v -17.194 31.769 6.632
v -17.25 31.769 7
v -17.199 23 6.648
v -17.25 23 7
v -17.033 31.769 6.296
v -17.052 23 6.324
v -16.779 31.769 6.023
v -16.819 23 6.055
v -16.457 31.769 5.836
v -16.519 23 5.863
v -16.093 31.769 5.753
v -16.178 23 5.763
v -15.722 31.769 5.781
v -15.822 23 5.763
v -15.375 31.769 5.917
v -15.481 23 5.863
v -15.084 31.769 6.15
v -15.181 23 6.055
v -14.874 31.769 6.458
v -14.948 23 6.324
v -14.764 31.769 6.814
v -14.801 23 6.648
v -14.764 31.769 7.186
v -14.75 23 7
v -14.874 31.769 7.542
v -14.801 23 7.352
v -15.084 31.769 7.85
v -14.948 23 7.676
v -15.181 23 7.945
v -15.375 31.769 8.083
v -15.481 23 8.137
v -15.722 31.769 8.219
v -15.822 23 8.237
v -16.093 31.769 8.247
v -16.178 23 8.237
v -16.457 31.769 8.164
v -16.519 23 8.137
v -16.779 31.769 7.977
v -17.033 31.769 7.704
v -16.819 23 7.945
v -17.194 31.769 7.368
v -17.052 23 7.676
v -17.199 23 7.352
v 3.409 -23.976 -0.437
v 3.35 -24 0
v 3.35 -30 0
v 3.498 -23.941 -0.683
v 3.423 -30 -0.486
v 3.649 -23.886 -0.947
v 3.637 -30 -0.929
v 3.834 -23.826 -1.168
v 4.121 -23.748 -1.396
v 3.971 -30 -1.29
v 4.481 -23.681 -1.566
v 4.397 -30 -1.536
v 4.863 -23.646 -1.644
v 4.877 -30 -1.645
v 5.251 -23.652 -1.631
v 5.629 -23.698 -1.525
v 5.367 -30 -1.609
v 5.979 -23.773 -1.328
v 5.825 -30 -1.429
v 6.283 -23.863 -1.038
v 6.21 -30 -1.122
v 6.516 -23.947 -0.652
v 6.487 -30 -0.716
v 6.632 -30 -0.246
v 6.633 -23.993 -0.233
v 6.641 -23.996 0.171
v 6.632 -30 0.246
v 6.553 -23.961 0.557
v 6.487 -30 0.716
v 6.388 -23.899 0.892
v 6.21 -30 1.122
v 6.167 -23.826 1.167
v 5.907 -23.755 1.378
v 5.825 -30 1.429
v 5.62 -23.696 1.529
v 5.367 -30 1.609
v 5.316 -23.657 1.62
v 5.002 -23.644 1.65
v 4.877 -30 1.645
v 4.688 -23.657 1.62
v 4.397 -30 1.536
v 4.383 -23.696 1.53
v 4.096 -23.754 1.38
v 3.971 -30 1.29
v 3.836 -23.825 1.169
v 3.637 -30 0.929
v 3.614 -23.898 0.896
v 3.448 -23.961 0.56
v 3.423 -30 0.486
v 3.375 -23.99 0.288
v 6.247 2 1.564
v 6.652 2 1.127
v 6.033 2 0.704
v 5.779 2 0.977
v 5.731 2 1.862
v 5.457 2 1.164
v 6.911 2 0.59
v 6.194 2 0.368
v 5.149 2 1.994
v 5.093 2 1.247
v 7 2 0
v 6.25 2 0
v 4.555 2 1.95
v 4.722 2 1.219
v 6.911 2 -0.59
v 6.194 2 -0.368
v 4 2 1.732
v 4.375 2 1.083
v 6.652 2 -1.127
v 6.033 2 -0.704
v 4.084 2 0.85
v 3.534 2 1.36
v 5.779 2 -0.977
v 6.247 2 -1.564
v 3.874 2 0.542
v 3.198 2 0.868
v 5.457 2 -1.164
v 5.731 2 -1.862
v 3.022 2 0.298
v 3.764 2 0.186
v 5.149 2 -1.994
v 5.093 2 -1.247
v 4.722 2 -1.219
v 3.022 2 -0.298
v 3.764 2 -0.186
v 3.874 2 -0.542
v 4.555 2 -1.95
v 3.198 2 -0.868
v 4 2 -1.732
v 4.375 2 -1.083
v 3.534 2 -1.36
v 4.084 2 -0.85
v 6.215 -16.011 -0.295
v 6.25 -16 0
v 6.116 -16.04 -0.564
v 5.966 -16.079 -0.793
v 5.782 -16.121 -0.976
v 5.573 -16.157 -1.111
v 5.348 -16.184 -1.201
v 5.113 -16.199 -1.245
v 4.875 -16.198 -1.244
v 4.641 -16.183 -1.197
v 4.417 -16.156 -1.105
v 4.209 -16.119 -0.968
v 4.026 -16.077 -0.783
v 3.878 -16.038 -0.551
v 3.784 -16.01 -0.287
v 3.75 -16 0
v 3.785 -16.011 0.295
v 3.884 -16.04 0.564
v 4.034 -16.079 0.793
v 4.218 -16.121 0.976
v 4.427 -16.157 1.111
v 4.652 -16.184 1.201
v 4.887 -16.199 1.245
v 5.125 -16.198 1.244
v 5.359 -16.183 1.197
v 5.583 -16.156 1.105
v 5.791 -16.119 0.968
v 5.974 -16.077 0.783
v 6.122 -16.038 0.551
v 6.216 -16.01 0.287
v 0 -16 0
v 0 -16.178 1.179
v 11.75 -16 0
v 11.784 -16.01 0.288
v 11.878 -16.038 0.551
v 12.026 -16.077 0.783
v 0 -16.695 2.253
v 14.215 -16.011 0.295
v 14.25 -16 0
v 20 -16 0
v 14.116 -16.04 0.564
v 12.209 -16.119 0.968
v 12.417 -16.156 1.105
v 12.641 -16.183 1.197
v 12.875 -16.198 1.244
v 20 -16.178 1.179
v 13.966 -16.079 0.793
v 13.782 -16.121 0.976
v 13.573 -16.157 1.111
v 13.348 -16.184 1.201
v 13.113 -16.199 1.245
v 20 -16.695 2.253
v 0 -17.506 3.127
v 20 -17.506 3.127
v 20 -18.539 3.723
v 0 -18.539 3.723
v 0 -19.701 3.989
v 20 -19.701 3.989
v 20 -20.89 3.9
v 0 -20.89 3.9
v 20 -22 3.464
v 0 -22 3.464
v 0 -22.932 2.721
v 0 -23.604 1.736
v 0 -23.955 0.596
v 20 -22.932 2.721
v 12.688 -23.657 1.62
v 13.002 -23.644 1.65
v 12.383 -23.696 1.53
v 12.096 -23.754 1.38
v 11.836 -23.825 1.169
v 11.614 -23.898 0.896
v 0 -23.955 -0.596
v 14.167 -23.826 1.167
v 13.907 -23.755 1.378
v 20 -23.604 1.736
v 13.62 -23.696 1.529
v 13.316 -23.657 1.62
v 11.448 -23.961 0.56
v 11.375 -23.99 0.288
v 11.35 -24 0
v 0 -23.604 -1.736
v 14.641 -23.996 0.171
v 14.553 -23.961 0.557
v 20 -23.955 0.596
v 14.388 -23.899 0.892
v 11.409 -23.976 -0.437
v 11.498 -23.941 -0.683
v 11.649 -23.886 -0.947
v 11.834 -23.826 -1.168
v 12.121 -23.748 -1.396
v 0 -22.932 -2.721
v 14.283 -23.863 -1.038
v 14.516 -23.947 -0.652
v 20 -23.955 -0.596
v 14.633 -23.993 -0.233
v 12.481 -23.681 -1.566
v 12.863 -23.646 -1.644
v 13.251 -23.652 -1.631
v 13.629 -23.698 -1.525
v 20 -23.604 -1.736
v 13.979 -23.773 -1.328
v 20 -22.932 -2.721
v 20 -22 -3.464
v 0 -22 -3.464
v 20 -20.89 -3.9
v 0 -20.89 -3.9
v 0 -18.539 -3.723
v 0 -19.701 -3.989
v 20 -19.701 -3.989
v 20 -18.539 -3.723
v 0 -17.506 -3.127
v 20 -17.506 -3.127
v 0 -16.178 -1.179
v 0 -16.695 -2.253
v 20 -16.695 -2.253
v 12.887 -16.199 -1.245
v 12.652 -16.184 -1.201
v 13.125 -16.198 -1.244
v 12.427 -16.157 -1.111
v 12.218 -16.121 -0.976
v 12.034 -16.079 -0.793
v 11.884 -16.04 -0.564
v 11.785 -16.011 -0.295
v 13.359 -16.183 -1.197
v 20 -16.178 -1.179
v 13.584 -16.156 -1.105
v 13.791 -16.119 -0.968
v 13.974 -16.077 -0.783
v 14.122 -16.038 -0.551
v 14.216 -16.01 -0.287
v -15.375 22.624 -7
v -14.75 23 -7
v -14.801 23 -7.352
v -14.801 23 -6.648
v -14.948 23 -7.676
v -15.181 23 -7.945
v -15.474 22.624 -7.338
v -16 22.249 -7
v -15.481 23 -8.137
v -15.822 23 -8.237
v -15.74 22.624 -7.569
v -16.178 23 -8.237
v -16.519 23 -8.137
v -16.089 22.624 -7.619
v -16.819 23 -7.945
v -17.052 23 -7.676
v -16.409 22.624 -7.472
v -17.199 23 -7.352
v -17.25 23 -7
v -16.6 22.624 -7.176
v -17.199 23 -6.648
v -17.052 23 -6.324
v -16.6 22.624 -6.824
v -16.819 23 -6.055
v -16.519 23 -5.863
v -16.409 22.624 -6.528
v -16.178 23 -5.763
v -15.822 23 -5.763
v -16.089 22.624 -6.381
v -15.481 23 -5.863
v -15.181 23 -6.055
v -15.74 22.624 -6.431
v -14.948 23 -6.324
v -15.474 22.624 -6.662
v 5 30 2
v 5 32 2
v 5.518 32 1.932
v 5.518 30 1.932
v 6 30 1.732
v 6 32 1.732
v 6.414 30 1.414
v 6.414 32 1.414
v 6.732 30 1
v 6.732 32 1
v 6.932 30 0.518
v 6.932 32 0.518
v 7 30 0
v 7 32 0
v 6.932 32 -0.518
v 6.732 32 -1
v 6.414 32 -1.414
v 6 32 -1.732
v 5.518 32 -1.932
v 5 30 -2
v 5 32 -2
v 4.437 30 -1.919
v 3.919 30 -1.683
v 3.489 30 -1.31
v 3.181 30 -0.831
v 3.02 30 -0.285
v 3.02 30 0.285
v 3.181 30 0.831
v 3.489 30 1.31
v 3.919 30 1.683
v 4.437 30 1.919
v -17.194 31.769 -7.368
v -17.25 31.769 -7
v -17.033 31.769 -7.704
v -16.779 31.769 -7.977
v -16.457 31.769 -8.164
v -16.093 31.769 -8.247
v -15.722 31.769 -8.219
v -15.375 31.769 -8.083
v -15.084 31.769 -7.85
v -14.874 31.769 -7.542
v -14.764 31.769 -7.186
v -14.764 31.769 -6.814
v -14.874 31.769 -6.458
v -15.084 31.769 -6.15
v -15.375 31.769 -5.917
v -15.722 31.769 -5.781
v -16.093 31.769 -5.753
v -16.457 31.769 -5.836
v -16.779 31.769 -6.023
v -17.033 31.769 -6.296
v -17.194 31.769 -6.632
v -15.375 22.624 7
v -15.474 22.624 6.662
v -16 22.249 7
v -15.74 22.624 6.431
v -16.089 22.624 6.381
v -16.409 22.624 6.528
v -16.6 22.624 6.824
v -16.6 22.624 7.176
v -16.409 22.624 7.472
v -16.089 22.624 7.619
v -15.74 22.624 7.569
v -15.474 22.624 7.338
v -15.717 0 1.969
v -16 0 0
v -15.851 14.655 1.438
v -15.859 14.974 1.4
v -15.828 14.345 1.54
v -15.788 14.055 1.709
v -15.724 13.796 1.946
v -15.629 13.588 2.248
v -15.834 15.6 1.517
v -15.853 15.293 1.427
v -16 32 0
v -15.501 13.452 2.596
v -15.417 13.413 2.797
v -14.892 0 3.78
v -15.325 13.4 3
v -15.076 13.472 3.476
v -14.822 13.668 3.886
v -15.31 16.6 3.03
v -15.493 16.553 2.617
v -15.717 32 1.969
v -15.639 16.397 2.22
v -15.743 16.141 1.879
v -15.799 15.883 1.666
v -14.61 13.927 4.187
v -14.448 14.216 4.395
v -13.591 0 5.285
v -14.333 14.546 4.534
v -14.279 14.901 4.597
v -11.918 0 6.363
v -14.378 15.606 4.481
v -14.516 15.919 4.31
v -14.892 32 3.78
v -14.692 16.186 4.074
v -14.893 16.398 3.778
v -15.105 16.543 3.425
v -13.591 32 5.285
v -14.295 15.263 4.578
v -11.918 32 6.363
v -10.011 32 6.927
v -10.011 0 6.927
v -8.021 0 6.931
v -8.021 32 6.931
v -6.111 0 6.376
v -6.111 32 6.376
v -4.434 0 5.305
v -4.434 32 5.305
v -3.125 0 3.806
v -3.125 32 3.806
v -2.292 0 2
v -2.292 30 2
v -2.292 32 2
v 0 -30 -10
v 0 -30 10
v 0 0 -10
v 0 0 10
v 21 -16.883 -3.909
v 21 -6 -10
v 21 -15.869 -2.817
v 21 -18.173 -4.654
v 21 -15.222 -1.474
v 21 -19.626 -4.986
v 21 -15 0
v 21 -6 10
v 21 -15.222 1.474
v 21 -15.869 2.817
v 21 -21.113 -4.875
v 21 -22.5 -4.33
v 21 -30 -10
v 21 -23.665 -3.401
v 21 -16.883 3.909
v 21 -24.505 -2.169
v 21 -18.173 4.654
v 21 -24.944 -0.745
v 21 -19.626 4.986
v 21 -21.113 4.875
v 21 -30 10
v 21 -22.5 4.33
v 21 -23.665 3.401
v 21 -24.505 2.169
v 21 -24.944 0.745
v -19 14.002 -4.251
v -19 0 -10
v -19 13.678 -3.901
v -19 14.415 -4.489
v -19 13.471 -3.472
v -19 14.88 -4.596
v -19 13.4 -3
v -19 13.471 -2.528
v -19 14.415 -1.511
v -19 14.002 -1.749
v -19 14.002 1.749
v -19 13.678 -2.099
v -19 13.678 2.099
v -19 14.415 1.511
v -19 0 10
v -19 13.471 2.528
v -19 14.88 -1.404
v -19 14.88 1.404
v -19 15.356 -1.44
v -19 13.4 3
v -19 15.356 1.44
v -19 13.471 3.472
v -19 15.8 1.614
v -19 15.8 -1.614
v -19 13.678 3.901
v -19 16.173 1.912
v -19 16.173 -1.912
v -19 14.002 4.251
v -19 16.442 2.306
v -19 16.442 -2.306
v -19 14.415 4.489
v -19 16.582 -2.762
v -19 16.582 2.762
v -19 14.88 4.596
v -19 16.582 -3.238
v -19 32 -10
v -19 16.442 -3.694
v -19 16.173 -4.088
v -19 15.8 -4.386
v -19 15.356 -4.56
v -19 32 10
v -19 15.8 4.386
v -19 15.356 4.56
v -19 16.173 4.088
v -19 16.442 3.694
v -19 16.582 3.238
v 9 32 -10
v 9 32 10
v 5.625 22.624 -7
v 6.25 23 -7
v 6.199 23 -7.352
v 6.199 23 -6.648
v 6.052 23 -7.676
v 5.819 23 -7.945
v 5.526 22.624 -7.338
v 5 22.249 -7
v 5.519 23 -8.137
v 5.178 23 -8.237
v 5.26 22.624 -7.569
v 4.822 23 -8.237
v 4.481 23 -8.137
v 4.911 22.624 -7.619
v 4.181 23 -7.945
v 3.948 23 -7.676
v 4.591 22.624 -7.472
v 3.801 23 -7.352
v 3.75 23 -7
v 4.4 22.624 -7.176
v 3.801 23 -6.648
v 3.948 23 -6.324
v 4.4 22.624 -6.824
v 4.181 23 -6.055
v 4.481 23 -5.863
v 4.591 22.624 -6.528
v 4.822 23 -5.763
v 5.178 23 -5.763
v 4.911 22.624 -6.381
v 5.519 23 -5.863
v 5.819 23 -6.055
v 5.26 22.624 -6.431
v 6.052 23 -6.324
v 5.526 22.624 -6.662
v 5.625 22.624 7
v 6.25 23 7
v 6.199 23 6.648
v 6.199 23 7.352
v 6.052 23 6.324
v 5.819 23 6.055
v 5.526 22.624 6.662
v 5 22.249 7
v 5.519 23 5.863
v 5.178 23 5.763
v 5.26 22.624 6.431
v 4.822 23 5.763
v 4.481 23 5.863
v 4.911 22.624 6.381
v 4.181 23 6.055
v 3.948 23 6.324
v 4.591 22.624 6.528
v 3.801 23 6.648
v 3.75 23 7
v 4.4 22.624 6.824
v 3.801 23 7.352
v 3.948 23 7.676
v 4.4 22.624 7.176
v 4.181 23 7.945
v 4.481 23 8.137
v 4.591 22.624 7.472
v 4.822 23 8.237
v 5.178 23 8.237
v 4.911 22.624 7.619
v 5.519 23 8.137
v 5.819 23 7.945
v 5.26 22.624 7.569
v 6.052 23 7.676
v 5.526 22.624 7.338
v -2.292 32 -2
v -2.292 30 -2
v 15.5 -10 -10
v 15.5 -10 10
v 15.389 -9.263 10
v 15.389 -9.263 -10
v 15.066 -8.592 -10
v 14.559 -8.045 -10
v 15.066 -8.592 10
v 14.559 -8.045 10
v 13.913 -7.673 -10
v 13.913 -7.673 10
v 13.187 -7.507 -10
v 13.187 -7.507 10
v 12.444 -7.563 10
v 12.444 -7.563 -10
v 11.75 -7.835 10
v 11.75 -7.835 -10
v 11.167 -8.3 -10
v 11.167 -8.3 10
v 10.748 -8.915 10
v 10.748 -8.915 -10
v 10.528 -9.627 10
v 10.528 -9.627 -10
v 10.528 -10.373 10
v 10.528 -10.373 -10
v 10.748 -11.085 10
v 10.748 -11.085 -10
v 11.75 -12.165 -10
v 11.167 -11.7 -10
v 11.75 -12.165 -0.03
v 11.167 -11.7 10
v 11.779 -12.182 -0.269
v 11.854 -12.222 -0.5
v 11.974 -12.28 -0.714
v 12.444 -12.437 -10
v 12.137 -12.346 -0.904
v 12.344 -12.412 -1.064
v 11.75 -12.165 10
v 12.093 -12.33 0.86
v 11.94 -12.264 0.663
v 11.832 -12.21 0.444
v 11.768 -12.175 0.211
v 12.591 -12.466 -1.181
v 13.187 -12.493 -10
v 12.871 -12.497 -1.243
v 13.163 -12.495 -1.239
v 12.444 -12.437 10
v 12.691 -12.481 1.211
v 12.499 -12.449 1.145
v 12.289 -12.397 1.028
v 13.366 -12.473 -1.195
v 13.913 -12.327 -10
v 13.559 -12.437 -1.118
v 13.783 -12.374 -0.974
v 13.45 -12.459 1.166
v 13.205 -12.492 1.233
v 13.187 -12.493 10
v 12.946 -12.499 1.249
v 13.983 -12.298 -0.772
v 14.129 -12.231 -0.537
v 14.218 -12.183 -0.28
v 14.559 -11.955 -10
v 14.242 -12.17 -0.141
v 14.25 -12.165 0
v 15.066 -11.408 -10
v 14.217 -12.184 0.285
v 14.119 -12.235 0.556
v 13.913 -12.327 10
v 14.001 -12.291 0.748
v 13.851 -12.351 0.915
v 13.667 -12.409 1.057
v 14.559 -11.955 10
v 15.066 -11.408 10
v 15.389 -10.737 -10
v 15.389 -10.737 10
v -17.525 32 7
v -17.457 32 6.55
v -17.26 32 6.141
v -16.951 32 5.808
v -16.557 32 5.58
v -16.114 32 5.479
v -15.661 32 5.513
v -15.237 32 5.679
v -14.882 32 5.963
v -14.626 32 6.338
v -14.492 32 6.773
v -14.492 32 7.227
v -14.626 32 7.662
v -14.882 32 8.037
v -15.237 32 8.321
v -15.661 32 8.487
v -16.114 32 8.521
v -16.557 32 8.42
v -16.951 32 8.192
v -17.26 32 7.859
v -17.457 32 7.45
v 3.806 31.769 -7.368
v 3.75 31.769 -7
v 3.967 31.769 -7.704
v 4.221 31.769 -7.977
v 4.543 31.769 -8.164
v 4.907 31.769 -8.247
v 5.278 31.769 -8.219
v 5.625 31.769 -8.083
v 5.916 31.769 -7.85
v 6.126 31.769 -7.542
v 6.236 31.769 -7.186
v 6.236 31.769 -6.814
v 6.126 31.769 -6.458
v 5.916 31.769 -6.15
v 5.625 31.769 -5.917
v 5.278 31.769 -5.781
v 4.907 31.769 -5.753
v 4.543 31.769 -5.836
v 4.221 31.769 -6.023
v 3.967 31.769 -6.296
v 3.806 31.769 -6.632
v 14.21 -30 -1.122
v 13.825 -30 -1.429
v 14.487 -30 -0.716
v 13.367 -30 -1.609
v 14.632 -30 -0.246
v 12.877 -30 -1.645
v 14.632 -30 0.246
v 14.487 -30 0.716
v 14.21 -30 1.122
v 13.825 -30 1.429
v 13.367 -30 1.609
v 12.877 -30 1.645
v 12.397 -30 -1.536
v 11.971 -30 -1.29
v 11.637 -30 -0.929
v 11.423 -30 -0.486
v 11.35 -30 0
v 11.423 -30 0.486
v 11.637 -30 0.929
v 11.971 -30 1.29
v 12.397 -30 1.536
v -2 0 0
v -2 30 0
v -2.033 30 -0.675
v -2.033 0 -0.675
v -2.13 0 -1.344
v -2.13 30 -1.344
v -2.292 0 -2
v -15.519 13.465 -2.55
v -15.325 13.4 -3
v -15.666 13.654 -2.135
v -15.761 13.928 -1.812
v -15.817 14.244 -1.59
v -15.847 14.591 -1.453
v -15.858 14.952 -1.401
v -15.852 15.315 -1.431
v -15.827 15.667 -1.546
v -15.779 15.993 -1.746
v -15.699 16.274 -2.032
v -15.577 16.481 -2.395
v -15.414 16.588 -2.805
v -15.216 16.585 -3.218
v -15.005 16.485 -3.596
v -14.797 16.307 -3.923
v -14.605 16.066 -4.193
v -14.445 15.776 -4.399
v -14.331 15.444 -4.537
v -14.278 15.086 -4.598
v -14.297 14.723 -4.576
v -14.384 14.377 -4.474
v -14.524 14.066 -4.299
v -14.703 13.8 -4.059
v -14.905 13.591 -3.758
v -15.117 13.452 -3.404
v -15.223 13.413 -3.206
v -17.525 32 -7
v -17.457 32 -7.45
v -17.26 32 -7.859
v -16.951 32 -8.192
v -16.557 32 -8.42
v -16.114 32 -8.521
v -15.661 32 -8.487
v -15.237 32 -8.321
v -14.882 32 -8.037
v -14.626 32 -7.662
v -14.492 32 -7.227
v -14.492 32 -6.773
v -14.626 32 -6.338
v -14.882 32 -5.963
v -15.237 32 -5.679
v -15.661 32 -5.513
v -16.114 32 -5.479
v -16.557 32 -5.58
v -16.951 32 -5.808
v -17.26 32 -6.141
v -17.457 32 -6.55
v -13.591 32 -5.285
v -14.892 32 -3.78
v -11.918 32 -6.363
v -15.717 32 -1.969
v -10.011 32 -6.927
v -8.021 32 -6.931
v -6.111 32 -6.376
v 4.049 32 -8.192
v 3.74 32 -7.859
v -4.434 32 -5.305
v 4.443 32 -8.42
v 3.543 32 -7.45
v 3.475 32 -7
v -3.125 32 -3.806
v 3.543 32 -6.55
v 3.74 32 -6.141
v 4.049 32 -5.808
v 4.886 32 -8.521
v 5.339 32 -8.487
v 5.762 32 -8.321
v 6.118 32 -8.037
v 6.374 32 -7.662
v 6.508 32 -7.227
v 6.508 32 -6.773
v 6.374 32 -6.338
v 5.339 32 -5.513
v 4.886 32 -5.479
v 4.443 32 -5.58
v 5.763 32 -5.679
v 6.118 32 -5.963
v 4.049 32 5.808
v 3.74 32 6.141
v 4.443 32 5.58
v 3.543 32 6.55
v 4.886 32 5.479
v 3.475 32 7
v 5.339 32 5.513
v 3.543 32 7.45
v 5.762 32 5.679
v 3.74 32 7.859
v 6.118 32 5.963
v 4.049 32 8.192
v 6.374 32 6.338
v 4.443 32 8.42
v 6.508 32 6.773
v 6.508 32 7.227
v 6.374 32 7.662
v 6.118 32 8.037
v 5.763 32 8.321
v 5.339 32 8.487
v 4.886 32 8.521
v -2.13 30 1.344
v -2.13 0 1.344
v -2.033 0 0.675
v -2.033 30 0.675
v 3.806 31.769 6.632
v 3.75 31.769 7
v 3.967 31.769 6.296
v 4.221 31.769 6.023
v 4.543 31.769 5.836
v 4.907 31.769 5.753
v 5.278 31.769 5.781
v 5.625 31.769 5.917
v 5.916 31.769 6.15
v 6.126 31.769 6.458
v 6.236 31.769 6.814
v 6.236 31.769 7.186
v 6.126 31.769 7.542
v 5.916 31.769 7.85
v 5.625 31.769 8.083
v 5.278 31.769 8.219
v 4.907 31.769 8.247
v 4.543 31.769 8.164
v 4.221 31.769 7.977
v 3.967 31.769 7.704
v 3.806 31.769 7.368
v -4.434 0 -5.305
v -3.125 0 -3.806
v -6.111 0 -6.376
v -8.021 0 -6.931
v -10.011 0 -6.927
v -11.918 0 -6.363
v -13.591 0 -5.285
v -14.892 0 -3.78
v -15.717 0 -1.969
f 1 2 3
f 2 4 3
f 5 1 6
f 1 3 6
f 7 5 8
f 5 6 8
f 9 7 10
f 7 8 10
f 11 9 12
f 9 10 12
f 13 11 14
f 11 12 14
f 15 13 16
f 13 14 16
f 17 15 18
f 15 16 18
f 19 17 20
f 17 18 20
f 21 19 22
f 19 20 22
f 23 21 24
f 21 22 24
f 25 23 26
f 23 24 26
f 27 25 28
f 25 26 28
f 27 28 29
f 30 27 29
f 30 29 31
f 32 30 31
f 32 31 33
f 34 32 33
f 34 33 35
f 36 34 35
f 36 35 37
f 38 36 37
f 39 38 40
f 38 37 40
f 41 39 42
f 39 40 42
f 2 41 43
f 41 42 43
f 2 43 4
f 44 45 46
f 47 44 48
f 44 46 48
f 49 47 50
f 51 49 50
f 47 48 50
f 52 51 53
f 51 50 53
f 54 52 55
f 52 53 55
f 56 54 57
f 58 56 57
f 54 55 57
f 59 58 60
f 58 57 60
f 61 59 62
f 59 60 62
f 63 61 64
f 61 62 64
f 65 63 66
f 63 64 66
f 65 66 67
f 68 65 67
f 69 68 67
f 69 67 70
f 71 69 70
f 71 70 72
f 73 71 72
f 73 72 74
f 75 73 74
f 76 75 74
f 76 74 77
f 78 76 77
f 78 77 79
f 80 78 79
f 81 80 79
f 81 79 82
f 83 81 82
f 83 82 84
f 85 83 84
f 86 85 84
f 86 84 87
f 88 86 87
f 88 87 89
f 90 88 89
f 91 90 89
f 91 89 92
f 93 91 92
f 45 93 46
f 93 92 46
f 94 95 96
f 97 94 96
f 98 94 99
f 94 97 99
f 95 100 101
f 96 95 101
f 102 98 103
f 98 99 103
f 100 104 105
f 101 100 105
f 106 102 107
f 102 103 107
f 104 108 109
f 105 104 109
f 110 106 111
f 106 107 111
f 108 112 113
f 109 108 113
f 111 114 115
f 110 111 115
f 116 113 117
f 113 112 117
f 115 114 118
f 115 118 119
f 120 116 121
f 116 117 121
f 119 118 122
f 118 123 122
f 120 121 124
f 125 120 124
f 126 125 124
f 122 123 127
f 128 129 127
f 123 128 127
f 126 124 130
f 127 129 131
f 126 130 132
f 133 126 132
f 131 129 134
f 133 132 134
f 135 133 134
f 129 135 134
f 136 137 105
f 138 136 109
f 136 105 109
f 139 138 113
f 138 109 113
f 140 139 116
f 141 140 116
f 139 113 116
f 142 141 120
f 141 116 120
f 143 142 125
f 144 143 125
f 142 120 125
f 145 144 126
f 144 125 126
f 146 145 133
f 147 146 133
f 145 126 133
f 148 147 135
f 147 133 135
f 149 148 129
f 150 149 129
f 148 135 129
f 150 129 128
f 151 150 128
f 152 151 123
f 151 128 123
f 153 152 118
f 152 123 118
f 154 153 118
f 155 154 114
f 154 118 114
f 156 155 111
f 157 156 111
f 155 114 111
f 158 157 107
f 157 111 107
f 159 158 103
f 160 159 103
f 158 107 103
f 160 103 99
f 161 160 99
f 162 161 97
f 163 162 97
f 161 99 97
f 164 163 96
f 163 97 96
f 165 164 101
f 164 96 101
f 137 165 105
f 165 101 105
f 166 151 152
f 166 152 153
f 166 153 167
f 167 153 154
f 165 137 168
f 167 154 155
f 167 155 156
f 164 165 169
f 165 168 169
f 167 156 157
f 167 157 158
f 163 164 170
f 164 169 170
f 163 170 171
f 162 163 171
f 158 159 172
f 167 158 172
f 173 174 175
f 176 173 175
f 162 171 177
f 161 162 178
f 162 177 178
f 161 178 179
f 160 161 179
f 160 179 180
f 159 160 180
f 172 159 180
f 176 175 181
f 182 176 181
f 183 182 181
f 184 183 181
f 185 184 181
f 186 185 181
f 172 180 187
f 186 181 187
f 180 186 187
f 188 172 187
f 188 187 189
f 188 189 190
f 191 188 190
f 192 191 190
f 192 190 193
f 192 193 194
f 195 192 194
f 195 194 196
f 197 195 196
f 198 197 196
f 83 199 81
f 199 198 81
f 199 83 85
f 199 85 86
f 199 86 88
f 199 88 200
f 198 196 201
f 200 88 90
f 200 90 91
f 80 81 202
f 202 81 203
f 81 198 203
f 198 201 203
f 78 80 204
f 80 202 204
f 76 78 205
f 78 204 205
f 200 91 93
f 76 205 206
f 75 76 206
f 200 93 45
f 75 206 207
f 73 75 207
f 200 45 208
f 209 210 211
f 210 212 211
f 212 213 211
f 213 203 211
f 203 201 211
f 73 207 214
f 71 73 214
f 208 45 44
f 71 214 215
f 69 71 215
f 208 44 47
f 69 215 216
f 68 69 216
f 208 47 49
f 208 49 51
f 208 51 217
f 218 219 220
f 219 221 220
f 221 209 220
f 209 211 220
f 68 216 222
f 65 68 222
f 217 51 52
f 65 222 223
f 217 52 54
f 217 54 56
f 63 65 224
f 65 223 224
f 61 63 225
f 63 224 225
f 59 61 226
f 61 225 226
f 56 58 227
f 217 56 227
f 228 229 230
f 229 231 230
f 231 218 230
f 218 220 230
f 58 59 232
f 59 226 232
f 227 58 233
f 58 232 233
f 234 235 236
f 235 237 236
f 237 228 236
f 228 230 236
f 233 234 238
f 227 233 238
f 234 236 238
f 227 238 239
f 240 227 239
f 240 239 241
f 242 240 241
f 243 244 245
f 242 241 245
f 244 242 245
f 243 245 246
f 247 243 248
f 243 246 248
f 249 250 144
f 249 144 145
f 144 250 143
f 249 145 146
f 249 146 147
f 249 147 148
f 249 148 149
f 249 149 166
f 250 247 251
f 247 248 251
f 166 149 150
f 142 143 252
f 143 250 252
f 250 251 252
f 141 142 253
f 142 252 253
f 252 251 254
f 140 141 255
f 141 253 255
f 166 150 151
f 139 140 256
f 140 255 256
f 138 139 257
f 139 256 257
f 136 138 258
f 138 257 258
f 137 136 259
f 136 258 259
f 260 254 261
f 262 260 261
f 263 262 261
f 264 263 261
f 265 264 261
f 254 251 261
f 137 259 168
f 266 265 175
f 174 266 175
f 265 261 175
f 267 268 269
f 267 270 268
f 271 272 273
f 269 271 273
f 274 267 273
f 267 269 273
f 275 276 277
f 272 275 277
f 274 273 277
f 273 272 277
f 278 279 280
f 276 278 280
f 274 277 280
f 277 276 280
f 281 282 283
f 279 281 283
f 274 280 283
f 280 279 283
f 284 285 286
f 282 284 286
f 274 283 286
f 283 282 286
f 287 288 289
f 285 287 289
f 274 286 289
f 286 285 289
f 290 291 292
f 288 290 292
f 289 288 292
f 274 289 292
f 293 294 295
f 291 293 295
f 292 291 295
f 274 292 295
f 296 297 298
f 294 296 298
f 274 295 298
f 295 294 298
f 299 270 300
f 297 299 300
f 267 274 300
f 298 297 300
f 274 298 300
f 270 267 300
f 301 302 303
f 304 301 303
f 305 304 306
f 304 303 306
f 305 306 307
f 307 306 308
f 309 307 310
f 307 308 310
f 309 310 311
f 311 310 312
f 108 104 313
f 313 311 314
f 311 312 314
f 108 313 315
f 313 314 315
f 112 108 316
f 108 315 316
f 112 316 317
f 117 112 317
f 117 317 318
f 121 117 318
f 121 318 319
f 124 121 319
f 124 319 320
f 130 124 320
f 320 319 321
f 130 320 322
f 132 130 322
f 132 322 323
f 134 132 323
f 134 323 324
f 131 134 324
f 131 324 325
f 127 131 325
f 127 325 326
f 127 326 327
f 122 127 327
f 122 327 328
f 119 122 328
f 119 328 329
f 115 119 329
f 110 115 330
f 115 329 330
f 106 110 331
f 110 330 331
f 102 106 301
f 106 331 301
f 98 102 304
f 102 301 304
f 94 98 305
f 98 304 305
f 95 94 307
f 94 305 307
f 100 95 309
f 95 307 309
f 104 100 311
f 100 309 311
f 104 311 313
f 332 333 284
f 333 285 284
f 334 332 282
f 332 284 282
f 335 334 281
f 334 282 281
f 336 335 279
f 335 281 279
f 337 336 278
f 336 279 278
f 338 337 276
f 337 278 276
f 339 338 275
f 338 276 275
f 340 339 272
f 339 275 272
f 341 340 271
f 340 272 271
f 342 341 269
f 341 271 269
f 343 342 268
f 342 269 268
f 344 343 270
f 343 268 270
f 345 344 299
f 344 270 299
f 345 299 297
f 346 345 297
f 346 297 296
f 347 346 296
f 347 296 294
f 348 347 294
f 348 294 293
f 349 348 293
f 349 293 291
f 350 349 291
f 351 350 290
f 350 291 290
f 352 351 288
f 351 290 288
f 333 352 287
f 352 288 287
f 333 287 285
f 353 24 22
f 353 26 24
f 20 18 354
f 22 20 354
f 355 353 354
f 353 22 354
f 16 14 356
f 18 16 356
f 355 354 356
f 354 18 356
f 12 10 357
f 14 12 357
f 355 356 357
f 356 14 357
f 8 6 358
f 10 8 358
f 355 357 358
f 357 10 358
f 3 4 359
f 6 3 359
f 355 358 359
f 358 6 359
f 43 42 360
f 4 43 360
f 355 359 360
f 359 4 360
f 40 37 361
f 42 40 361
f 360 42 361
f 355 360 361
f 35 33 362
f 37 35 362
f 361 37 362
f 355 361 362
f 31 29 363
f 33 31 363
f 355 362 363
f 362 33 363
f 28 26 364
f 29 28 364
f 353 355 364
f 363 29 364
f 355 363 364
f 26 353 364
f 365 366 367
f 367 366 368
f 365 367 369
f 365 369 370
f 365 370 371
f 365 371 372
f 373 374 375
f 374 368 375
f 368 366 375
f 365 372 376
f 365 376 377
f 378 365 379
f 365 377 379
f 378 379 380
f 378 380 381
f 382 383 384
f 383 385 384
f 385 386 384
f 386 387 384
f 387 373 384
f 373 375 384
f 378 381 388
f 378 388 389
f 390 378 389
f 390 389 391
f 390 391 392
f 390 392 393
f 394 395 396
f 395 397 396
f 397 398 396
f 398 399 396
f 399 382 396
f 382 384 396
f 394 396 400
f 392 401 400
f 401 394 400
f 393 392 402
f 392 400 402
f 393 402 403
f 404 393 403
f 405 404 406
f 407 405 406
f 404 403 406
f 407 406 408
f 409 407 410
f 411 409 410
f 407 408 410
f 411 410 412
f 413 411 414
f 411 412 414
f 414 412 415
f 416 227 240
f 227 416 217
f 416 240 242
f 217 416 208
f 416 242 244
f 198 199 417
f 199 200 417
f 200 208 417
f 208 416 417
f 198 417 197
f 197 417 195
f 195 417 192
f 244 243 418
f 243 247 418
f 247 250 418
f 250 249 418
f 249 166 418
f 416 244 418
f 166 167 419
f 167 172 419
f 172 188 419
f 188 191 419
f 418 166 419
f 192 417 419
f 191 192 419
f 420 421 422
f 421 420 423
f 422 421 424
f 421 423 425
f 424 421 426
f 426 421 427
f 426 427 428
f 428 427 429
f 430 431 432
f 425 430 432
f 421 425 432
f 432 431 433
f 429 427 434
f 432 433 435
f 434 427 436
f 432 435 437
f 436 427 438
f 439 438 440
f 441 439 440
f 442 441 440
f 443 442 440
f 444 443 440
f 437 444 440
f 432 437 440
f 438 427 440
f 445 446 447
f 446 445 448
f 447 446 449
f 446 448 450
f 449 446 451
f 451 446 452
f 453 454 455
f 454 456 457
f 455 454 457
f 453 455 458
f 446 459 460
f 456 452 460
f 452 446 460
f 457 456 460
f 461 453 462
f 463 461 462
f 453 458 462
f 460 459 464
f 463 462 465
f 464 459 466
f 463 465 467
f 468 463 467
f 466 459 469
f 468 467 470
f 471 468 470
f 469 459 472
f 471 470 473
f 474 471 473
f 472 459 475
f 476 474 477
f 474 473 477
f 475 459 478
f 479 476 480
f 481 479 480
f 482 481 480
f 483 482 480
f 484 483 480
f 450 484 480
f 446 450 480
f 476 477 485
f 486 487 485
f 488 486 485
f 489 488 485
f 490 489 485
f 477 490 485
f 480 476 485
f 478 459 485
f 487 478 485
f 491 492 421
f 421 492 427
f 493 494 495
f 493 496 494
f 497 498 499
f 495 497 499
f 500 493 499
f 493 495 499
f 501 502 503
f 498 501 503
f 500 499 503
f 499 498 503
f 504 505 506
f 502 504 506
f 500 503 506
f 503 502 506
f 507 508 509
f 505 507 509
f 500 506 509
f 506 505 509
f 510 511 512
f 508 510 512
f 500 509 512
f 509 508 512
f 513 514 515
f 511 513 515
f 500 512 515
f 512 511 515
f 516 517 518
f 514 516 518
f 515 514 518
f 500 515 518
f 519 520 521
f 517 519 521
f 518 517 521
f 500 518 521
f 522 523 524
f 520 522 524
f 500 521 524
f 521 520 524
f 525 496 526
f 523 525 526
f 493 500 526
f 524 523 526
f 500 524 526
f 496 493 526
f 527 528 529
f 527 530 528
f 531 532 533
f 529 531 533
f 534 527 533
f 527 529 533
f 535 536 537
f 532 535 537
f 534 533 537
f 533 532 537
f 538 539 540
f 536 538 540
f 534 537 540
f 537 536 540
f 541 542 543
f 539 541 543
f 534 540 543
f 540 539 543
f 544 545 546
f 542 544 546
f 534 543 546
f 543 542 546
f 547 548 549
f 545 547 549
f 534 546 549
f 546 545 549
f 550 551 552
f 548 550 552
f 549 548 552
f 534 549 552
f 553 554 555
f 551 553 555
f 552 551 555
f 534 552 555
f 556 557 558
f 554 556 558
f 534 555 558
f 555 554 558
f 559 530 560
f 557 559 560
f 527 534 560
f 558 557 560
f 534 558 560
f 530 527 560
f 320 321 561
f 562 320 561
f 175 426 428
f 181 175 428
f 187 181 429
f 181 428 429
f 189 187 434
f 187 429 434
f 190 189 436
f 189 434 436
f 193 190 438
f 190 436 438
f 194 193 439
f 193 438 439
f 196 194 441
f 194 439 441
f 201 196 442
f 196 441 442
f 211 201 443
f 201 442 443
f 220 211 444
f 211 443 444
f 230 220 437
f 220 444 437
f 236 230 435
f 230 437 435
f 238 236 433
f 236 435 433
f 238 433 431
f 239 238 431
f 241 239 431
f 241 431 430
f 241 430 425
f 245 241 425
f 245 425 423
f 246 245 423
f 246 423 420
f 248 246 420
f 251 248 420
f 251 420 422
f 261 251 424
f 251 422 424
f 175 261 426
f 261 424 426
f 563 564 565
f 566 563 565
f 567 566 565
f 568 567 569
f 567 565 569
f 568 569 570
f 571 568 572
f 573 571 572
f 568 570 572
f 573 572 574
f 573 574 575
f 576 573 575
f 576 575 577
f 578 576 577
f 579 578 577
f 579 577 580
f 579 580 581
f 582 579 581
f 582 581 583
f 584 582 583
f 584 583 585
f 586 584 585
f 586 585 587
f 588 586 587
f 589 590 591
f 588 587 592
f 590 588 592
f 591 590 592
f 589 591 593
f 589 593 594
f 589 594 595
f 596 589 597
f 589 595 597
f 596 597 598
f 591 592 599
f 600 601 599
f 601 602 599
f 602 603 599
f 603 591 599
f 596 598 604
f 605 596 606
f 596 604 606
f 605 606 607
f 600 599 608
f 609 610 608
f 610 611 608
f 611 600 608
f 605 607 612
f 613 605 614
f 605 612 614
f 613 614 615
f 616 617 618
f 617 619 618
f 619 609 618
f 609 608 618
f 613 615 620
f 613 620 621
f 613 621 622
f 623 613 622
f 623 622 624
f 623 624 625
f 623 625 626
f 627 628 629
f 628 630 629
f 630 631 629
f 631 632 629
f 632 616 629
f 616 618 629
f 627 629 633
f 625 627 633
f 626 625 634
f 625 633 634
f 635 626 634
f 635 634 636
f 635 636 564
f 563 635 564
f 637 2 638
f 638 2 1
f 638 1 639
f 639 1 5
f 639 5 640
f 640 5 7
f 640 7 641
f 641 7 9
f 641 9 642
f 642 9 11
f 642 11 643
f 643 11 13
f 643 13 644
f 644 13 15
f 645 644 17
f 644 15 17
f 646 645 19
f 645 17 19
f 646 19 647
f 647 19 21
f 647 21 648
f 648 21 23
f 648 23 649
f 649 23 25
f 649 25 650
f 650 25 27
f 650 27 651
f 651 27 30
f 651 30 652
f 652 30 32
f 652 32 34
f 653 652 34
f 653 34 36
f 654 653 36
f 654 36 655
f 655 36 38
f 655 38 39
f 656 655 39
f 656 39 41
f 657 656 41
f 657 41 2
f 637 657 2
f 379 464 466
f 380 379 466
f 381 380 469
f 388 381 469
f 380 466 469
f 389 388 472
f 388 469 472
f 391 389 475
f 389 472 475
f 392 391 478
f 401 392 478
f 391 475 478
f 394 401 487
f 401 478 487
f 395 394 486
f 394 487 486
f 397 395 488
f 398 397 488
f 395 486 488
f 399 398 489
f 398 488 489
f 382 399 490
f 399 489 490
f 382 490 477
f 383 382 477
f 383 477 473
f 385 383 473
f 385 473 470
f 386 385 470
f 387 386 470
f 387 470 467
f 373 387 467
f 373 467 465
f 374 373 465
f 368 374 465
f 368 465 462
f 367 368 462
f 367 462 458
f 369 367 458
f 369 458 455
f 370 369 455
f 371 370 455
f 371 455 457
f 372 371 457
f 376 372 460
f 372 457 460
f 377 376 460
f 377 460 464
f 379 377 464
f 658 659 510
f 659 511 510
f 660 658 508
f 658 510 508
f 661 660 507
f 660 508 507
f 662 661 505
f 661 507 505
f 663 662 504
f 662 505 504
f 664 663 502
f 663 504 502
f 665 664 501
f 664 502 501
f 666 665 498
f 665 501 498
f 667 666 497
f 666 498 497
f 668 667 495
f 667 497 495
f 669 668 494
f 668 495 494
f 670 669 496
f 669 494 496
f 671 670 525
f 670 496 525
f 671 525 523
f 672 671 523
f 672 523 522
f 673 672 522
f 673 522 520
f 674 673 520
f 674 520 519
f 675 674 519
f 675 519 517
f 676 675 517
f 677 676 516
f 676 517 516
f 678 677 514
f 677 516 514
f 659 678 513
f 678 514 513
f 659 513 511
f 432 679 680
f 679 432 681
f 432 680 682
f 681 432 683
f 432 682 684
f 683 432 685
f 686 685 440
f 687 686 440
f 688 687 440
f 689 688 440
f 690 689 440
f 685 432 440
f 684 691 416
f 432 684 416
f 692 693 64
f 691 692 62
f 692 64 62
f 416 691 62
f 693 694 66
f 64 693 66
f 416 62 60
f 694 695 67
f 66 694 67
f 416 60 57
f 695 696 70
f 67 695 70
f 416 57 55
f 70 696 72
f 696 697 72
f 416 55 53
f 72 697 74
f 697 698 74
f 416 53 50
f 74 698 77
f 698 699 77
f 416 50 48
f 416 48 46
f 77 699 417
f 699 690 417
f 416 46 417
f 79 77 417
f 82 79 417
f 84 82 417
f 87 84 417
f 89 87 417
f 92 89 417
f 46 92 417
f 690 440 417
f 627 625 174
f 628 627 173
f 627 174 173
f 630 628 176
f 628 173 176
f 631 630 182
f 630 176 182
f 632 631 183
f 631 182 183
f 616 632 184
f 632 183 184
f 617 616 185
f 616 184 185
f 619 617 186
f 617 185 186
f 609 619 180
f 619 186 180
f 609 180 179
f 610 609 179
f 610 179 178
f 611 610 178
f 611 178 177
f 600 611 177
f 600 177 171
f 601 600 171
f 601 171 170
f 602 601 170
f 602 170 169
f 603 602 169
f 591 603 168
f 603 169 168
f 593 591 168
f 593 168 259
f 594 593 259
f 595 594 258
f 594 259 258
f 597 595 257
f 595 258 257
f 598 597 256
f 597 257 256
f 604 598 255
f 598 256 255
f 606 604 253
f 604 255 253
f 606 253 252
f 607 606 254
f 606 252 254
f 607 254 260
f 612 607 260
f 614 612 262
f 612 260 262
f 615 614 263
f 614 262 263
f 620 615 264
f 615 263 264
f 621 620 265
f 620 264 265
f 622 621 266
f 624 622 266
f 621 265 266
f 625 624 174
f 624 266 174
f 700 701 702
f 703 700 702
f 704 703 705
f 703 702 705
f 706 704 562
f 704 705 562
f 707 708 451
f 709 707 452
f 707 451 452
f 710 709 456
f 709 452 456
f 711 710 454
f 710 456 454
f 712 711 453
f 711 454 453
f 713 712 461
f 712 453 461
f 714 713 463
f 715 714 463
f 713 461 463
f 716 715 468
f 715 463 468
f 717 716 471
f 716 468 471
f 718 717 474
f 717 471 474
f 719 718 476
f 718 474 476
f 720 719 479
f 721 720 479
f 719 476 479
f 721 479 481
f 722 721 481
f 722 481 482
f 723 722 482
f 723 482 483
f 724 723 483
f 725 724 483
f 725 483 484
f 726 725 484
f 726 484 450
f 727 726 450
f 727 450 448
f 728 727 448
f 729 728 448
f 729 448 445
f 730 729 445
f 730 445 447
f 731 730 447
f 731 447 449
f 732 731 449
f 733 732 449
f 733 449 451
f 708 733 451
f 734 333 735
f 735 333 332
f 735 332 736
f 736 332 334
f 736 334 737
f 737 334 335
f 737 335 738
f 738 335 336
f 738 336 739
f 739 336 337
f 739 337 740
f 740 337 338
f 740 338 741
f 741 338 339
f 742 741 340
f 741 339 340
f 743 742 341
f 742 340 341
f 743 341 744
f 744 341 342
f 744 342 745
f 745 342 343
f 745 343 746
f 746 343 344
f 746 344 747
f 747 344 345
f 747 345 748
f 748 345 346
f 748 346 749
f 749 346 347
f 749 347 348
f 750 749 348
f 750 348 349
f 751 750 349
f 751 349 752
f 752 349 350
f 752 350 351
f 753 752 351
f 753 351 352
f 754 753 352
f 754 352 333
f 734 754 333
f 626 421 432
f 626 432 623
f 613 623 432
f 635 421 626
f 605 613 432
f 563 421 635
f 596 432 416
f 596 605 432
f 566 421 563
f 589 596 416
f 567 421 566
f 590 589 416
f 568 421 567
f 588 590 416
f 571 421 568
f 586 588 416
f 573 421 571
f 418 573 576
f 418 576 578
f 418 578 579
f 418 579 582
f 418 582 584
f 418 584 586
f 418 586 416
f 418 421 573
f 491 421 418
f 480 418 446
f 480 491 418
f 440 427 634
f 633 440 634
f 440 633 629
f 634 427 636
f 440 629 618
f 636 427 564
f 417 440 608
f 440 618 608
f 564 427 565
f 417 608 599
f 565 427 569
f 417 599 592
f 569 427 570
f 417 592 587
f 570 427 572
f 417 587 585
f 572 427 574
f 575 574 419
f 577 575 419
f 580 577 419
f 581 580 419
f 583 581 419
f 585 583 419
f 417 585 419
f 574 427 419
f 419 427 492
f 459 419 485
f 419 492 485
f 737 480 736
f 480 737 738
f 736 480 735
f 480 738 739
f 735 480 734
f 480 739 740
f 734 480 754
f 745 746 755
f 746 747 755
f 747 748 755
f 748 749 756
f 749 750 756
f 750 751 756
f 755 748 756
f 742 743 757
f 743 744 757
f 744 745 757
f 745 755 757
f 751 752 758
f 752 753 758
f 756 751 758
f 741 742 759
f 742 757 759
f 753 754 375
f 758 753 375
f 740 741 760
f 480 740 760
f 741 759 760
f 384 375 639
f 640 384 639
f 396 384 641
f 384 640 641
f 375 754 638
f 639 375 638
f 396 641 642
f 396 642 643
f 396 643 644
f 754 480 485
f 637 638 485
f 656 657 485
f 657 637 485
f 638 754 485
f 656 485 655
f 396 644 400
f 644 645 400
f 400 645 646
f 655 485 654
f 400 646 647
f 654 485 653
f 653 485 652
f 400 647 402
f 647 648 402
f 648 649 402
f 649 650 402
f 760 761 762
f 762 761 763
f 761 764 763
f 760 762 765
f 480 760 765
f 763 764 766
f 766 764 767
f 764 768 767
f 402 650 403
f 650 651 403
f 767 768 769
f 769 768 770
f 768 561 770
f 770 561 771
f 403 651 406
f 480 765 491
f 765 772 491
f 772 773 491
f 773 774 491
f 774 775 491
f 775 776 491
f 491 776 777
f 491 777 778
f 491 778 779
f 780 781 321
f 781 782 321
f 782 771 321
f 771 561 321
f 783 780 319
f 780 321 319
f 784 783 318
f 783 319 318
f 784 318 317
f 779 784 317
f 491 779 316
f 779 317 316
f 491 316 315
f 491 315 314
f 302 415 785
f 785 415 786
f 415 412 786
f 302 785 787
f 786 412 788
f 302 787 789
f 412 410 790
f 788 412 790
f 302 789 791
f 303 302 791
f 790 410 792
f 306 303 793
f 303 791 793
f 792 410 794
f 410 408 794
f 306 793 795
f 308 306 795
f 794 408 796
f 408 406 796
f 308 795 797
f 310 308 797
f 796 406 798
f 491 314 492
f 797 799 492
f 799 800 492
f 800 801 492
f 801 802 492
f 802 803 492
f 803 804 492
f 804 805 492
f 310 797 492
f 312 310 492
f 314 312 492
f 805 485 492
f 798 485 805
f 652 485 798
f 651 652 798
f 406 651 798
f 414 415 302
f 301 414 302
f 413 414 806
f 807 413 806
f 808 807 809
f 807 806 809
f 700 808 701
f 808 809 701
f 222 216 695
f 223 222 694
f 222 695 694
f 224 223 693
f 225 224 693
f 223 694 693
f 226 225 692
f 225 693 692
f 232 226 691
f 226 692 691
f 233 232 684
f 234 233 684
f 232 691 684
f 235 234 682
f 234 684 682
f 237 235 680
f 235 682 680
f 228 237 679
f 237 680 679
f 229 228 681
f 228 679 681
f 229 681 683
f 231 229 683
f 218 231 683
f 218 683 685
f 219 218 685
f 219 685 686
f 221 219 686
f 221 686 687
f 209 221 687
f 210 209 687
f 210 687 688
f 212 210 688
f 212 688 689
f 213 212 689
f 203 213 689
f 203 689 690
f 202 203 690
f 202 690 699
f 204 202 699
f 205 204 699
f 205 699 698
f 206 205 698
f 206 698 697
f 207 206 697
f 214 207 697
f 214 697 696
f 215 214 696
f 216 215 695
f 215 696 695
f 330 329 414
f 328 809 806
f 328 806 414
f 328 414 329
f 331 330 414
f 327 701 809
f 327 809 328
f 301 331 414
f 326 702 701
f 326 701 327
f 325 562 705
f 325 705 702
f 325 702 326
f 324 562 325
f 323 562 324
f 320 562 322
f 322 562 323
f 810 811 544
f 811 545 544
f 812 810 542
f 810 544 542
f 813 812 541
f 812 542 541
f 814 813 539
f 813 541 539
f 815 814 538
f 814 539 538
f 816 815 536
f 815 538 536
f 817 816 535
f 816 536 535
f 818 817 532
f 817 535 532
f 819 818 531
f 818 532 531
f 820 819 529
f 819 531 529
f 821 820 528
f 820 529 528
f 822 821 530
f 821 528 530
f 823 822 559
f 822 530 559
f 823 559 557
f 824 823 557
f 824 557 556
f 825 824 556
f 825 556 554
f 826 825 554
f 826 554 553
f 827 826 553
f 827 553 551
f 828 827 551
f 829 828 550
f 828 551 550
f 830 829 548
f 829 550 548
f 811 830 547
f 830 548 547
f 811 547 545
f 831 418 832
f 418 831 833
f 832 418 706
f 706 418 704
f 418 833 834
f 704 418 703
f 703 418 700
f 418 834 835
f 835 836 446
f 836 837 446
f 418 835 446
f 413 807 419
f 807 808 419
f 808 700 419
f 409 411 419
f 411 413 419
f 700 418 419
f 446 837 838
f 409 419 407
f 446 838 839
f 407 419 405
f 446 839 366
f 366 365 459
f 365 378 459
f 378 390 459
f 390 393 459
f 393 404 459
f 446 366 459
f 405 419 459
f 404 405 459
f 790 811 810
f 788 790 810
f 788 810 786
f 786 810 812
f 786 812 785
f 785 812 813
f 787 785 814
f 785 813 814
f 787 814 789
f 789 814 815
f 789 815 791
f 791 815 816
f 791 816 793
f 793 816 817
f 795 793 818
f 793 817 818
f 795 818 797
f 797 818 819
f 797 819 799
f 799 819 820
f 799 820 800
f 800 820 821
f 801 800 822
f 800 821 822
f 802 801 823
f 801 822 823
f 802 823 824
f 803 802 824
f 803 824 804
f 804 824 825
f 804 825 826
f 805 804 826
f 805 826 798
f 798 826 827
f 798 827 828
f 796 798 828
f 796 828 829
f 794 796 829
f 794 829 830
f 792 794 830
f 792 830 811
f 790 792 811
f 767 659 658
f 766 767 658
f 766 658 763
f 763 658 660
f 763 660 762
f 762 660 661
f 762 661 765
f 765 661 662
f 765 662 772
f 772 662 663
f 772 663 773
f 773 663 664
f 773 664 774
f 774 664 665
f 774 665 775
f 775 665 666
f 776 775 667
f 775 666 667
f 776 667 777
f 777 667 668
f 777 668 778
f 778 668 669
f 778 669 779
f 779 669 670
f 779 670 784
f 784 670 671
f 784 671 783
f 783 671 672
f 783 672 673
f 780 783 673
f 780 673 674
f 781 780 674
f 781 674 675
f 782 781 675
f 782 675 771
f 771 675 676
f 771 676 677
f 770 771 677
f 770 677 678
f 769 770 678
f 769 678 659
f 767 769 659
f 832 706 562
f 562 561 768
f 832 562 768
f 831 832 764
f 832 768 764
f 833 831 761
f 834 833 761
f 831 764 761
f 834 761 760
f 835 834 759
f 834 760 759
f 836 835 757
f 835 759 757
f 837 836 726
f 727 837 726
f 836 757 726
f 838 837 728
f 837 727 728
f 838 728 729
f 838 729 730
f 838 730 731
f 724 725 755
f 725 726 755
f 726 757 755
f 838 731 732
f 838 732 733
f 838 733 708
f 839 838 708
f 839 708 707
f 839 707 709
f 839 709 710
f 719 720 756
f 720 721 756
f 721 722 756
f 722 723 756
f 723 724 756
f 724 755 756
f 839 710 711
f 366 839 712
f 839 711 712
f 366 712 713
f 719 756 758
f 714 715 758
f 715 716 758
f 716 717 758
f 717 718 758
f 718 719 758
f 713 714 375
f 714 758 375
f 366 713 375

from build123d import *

# Parameters (mm, degrees)
BOSS_EXTRUDE1_DEPTH         = 10
CUT_EXTRUDE1_DEPTH          = 67.219332525
CUT_EXTRUDE2_DEPTH          = 2
M3_TAPPED_HOLE2_D           = 2.5
M3_TAPPED_HOLE2_DEPTH       = 9
M3_TAPPED_HOLE2_CSINK_D     = 3.05
M3_TAPPED_HOLE2_CSINK_ANGLE = 100
M3_TAPPED_HOLE2_TIP         = 0.751075774
SKETCH7_R                   = 2.5
CUT_EXTRUDE3_DEPTH          = 44.185645763
SKETCH8_R                   = 4
CUT_EXTRUDE4_DEPTH          = 53.191953403
CHAMFER1_SIZE               = 1
CUT_EXTRUDE5_REACH          = 54.192
CUT_EXTRUDE5_END_RADIUS     = 7
SKETCH11_R                  = 1.6
M4_TAPPED_HOLE1_REACH       = 68.219
M4_TAPPED_HOLE1_BORE_R      = 1.65
CUT_EXTRUDE6_REACH          = 68.219
CUT_EXTRUDE6_END_RADIUS     = 2.5
SKETCH14_R                  = 1.25


# Read off the part's stored shape, not the designer's step: Hole1
with BuildPart() as part:
    # Sketch1 → Boss-Extrude1 (new, symmetric)
    with BuildSketch(Plane.XY):
        Polygon((0, 0), (-19, 0), (-19, 32), (9, 32), (21, -6), (21, -30), (0, -30), align=None)
    extrude(amount=BOSS_EXTRUDE1_DEPTH, both=True)

    # Sketch2 → Cut-Extrude1 (cut, through all)
    with BuildSketch(Plane(origin=(0, 32, 0), x_dir=(1, 0, 0), z_dir=(0, 1, 0))):
        with BuildLine():
            ThreePointArc((-2.291796068, 2), (-10.010587075, 6.926666858), (-16, 0))
            Line((-16, 0), (-2, 0))
            ThreePointArc((-2, 0), (-2.073333142, 1.010587075), (-2.291796068, 2))
        make_face()
        with BuildLine():
            Line((-2, 0), (-16, 0))
            ThreePointArc((-16, 0), (-10.010587075, -6.926666858), (-2.291796068, -2))
            ThreePointArc((-2.291796068, -2), (-2.073333142, -1.010587075), (-2, 0))
        make_face()
    extrude(amount=-CUT_EXTRUDE1_DEPTH, mode=Mode.SUBTRACT)

    # Sketch2<3> → Cut-Extrude2 (cut)
    with BuildSketch(Plane(origin=(0, 32, 0), x_dir=(1, 0, 0), z_dir=(0, 1, 0))):
        with BuildLine():
            ThreePointArc((5, 2), (3.585786438, 1.414213562), (3, 0))
            Line((3, 0), (7, 0))
            ThreePointArc((7, 0), (6.414213562, 1.414213562), (5, 2))
        make_face()
        with BuildLine():
            Line((7, 0), (3, 0))
            ThreePointArc((3, 0), (3.585786438, -1.414213562), (5, -2))
            ThreePointArc((5, -2), (6.414213562, -1.414213562), (7, 0))
        make_face()
        with BuildLine():
            ThreePointArc((-2.291796068, 2), (-2.073333142, 1.010587075), (-2, 0))
            Line((-2, 0), (3, 0))
            ThreePointArc((3, 0), (3.585786438, 1.414213562), (5, 2))
            Line((5, 2), (-2.291796068, 2))
        make_face()
        with BuildLine():
            Line((3, 0), (-2, 0))
            ThreePointArc((-2, 0), (-2.073333142, -1.010587075), (-2.291796068, -2))
            Line((-2.291796068, -2), (5, -2))
            ThreePointArc((5, -2), (3.585786438, -1.414213562), (3, 0))
        make_face()
    extrude(amount=-CUT_EXTRUDE2_DEPTH, mode=Mode.SUBTRACT)

    # M3 Tapped Hole2
    with Locations(Plane(origin=(0, 32, 0), x_dir=(1, 0, 0), z_dir=(0, 1, 0))):
        with Locations((-16, 7), (-16, -7), (5, 7), (5, -7)):
            CounterSinkHole(M3_TAPPED_HOLE2_D / 2, M3_TAPPED_HOLE2_CSINK_D / 2, depth=M3_TAPPED_HOLE2_DEPTH, counter_sink_angle=M3_TAPPED_HOLE2_CSINK_ANGLE)
            with Locations((0, 0, -(M3_TAPPED_HOLE2_DEPTH + M3_TAPPED_HOLE2_TIP / 2))):  # 118° drill point
                Cone(0, M3_TAPPED_HOLE2_D / 2, M3_TAPPED_HOLE2_TIP, mode=Mode.SUBTRACT)

    # Sketch7 → Cut-Extrude3 (cut, through all)
    with BuildSketch(Plane.XY.offset(10)):
        with Locations((13, -10)):
            Circle(SKETCH7_R)
    extrude(amount=-CUT_EXTRUDE3_DEPTH, mode=Mode.SUBTRACT)

    # Sketch8 → Cut-Extrude4 (cut, through all)
    with BuildSketch(Plane(origin=(21, 0, 0), x_dir=(0, 0, -1), z_dir=(1, 0, 0))):
        with Locations(Location((0, -20, 0), (0, 0, 90))):
            Circle(SKETCH8_R)
    extrude(amount=-CUT_EXTRUDE4_DEPTH, mode=Mode.SUBTRACT)

    # Chamfer1
    chamfer1_edges = [part.edges().sort_by_distance(p)[0] for p in [
        (21, -24, 0),
    ]]
    chamfer(chamfer1_edges, length=CHAMFER1_SIZE)

    # Hole1 outline → Hole1 (revolve, cut)
    with BuildSketch(Plane(origin=(5, 0, 0), x_dir=(1, 0, 0), z_dir=(0, 0, 1))):
        Polygon((1.25, 2), (2, 2), (2, 32), (0, 32), (0, -16.200413917), (1.25, -16.200413917), align=None)
    revolve(axis=Axis((5, 0, 0), (0, 1, 0)), mode=Mode.SUBTRACT)

    # Cut-Extrude5: up to this cylinder (the profile starts outside it)
    cut_extrude5_end = Plane(origin=(-9, 15, 0), z_dir=(0, 1, 0)) * Cylinder(CUT_EXTRUDE5_END_RADIUS, 123.384, mode=Mode.PRIVATE)
    # Sketch11 → Cut-Extrude5 (cut, up to the surface)
    with BuildSketch(Plane.ZY.offset(19), mode=Mode.PRIVATE) as cut_extrude5_sk1:
        with Locations(Location((-3, 15, 0), (0, 0, 270))):
            Circle(SKETCH11_R)
    cut_extrude5_tool1 = extrude(cut_extrude5_sk1.sketch, amount=-CUT_EXTRUDE5_REACH, mode=Mode.PRIVATE) - cut_extrude5_end
    add(cut_extrude5_tool1.solids().sort_by_distance((-19, 15, -3))[0], mode=Mode.SUBTRACT)
    # Sketch11 → Cut-Extrude5 (cut, up to the surface)
    with BuildSketch(Plane.ZY.offset(19), mode=Mode.PRIVATE) as cut_extrude5_sk2:
        with Locations(Location((3, 15, 0), (0, 0, 270))):
            Circle(SKETCH11_R)
    cut_extrude5_tool2 = extrude(cut_extrude5_sk2.sketch, amount=-CUT_EXTRUDE5_REACH, mode=Mode.PRIVATE) - cut_extrude5_end
    add(cut_extrude5_tool2.solids().sort_by_distance((-19, 15, 3))[0], mode=Mode.SUBTRACT)

    # M4 Tapped Hole1 bore → M4 Tapped Hole1 (cut, up to next)
    with BuildSketch(Plane(origin=(0, -30, 0), x_dir=(-1, 0, 0), z_dir=(0, -1, 0)), mode=Mode.PRIVATE) as m4_tapped_hole1_sk1:
        with Locations((-13, 0)):
            Circle(M4_TAPPED_HOLE1_BORE_R)
    m4_tapped_hole1_tool1 = extrude(m4_tapped_hole1_sk1.sketch, amount=-M4_TAPPED_HOLE1_REACH, mode=Mode.PRIVATE) & part.part
    # M4 Tapped Hole1 bore → M4 Tapped Hole1 (cut, up to next)
    with BuildSketch(Plane(origin=(0, -30, 0), x_dir=(-1, 0, 0), z_dir=(0, -1, 0)), mode=Mode.PRIVATE) as m4_tapped_hole1_sk2:
        with Locations((-5, 0)):
            Circle(M4_TAPPED_HOLE1_BORE_R)
    m4_tapped_hole1_tool2 = extrude(m4_tapped_hole1_sk2.sketch, amount=-M4_TAPPED_HOLE1_REACH, mode=Mode.PRIVATE) & part.part
    add(m4_tapped_hole1_tool1.solids().sort_by_distance((13, -30, 0))[0], mode=Mode.SUBTRACT)
    add(m4_tapped_hole1_tool2.solids().sort_by_distance((5, -30, 0))[0], mode=Mode.SUBTRACT)

    # Cut-Extrude6: up to this cylinder (the profile starts outside it)
    cut_extrude6_end = Plane(origin=(13, -10, 0), z_dir=(0, 0, 1)) * Cylinder(CUT_EXTRUDE6_END_RADIUS, 142.438, mode=Mode.PRIVATE)
    # Sketch14 → Cut-Extrude6 (cut, up to the surface)
    with BuildSketch(Plane.XZ.offset(30), mode=Mode.PRIVATE) as cut_extrude6_sk1:
        with Locations((13, 0)):
            Circle(SKETCH14_R)
    cut_extrude6_tool1 = extrude(cut_extrude6_sk1.sketch, amount=-CUT_EXTRUDE6_REACH, mode=Mode.PRIVATE) - cut_extrude6_end
    add(cut_extrude6_tool1.solids().sort_by_distance((13, -30, 0))[0], mode=Mode.SUBTRACT)


solid = part.part
